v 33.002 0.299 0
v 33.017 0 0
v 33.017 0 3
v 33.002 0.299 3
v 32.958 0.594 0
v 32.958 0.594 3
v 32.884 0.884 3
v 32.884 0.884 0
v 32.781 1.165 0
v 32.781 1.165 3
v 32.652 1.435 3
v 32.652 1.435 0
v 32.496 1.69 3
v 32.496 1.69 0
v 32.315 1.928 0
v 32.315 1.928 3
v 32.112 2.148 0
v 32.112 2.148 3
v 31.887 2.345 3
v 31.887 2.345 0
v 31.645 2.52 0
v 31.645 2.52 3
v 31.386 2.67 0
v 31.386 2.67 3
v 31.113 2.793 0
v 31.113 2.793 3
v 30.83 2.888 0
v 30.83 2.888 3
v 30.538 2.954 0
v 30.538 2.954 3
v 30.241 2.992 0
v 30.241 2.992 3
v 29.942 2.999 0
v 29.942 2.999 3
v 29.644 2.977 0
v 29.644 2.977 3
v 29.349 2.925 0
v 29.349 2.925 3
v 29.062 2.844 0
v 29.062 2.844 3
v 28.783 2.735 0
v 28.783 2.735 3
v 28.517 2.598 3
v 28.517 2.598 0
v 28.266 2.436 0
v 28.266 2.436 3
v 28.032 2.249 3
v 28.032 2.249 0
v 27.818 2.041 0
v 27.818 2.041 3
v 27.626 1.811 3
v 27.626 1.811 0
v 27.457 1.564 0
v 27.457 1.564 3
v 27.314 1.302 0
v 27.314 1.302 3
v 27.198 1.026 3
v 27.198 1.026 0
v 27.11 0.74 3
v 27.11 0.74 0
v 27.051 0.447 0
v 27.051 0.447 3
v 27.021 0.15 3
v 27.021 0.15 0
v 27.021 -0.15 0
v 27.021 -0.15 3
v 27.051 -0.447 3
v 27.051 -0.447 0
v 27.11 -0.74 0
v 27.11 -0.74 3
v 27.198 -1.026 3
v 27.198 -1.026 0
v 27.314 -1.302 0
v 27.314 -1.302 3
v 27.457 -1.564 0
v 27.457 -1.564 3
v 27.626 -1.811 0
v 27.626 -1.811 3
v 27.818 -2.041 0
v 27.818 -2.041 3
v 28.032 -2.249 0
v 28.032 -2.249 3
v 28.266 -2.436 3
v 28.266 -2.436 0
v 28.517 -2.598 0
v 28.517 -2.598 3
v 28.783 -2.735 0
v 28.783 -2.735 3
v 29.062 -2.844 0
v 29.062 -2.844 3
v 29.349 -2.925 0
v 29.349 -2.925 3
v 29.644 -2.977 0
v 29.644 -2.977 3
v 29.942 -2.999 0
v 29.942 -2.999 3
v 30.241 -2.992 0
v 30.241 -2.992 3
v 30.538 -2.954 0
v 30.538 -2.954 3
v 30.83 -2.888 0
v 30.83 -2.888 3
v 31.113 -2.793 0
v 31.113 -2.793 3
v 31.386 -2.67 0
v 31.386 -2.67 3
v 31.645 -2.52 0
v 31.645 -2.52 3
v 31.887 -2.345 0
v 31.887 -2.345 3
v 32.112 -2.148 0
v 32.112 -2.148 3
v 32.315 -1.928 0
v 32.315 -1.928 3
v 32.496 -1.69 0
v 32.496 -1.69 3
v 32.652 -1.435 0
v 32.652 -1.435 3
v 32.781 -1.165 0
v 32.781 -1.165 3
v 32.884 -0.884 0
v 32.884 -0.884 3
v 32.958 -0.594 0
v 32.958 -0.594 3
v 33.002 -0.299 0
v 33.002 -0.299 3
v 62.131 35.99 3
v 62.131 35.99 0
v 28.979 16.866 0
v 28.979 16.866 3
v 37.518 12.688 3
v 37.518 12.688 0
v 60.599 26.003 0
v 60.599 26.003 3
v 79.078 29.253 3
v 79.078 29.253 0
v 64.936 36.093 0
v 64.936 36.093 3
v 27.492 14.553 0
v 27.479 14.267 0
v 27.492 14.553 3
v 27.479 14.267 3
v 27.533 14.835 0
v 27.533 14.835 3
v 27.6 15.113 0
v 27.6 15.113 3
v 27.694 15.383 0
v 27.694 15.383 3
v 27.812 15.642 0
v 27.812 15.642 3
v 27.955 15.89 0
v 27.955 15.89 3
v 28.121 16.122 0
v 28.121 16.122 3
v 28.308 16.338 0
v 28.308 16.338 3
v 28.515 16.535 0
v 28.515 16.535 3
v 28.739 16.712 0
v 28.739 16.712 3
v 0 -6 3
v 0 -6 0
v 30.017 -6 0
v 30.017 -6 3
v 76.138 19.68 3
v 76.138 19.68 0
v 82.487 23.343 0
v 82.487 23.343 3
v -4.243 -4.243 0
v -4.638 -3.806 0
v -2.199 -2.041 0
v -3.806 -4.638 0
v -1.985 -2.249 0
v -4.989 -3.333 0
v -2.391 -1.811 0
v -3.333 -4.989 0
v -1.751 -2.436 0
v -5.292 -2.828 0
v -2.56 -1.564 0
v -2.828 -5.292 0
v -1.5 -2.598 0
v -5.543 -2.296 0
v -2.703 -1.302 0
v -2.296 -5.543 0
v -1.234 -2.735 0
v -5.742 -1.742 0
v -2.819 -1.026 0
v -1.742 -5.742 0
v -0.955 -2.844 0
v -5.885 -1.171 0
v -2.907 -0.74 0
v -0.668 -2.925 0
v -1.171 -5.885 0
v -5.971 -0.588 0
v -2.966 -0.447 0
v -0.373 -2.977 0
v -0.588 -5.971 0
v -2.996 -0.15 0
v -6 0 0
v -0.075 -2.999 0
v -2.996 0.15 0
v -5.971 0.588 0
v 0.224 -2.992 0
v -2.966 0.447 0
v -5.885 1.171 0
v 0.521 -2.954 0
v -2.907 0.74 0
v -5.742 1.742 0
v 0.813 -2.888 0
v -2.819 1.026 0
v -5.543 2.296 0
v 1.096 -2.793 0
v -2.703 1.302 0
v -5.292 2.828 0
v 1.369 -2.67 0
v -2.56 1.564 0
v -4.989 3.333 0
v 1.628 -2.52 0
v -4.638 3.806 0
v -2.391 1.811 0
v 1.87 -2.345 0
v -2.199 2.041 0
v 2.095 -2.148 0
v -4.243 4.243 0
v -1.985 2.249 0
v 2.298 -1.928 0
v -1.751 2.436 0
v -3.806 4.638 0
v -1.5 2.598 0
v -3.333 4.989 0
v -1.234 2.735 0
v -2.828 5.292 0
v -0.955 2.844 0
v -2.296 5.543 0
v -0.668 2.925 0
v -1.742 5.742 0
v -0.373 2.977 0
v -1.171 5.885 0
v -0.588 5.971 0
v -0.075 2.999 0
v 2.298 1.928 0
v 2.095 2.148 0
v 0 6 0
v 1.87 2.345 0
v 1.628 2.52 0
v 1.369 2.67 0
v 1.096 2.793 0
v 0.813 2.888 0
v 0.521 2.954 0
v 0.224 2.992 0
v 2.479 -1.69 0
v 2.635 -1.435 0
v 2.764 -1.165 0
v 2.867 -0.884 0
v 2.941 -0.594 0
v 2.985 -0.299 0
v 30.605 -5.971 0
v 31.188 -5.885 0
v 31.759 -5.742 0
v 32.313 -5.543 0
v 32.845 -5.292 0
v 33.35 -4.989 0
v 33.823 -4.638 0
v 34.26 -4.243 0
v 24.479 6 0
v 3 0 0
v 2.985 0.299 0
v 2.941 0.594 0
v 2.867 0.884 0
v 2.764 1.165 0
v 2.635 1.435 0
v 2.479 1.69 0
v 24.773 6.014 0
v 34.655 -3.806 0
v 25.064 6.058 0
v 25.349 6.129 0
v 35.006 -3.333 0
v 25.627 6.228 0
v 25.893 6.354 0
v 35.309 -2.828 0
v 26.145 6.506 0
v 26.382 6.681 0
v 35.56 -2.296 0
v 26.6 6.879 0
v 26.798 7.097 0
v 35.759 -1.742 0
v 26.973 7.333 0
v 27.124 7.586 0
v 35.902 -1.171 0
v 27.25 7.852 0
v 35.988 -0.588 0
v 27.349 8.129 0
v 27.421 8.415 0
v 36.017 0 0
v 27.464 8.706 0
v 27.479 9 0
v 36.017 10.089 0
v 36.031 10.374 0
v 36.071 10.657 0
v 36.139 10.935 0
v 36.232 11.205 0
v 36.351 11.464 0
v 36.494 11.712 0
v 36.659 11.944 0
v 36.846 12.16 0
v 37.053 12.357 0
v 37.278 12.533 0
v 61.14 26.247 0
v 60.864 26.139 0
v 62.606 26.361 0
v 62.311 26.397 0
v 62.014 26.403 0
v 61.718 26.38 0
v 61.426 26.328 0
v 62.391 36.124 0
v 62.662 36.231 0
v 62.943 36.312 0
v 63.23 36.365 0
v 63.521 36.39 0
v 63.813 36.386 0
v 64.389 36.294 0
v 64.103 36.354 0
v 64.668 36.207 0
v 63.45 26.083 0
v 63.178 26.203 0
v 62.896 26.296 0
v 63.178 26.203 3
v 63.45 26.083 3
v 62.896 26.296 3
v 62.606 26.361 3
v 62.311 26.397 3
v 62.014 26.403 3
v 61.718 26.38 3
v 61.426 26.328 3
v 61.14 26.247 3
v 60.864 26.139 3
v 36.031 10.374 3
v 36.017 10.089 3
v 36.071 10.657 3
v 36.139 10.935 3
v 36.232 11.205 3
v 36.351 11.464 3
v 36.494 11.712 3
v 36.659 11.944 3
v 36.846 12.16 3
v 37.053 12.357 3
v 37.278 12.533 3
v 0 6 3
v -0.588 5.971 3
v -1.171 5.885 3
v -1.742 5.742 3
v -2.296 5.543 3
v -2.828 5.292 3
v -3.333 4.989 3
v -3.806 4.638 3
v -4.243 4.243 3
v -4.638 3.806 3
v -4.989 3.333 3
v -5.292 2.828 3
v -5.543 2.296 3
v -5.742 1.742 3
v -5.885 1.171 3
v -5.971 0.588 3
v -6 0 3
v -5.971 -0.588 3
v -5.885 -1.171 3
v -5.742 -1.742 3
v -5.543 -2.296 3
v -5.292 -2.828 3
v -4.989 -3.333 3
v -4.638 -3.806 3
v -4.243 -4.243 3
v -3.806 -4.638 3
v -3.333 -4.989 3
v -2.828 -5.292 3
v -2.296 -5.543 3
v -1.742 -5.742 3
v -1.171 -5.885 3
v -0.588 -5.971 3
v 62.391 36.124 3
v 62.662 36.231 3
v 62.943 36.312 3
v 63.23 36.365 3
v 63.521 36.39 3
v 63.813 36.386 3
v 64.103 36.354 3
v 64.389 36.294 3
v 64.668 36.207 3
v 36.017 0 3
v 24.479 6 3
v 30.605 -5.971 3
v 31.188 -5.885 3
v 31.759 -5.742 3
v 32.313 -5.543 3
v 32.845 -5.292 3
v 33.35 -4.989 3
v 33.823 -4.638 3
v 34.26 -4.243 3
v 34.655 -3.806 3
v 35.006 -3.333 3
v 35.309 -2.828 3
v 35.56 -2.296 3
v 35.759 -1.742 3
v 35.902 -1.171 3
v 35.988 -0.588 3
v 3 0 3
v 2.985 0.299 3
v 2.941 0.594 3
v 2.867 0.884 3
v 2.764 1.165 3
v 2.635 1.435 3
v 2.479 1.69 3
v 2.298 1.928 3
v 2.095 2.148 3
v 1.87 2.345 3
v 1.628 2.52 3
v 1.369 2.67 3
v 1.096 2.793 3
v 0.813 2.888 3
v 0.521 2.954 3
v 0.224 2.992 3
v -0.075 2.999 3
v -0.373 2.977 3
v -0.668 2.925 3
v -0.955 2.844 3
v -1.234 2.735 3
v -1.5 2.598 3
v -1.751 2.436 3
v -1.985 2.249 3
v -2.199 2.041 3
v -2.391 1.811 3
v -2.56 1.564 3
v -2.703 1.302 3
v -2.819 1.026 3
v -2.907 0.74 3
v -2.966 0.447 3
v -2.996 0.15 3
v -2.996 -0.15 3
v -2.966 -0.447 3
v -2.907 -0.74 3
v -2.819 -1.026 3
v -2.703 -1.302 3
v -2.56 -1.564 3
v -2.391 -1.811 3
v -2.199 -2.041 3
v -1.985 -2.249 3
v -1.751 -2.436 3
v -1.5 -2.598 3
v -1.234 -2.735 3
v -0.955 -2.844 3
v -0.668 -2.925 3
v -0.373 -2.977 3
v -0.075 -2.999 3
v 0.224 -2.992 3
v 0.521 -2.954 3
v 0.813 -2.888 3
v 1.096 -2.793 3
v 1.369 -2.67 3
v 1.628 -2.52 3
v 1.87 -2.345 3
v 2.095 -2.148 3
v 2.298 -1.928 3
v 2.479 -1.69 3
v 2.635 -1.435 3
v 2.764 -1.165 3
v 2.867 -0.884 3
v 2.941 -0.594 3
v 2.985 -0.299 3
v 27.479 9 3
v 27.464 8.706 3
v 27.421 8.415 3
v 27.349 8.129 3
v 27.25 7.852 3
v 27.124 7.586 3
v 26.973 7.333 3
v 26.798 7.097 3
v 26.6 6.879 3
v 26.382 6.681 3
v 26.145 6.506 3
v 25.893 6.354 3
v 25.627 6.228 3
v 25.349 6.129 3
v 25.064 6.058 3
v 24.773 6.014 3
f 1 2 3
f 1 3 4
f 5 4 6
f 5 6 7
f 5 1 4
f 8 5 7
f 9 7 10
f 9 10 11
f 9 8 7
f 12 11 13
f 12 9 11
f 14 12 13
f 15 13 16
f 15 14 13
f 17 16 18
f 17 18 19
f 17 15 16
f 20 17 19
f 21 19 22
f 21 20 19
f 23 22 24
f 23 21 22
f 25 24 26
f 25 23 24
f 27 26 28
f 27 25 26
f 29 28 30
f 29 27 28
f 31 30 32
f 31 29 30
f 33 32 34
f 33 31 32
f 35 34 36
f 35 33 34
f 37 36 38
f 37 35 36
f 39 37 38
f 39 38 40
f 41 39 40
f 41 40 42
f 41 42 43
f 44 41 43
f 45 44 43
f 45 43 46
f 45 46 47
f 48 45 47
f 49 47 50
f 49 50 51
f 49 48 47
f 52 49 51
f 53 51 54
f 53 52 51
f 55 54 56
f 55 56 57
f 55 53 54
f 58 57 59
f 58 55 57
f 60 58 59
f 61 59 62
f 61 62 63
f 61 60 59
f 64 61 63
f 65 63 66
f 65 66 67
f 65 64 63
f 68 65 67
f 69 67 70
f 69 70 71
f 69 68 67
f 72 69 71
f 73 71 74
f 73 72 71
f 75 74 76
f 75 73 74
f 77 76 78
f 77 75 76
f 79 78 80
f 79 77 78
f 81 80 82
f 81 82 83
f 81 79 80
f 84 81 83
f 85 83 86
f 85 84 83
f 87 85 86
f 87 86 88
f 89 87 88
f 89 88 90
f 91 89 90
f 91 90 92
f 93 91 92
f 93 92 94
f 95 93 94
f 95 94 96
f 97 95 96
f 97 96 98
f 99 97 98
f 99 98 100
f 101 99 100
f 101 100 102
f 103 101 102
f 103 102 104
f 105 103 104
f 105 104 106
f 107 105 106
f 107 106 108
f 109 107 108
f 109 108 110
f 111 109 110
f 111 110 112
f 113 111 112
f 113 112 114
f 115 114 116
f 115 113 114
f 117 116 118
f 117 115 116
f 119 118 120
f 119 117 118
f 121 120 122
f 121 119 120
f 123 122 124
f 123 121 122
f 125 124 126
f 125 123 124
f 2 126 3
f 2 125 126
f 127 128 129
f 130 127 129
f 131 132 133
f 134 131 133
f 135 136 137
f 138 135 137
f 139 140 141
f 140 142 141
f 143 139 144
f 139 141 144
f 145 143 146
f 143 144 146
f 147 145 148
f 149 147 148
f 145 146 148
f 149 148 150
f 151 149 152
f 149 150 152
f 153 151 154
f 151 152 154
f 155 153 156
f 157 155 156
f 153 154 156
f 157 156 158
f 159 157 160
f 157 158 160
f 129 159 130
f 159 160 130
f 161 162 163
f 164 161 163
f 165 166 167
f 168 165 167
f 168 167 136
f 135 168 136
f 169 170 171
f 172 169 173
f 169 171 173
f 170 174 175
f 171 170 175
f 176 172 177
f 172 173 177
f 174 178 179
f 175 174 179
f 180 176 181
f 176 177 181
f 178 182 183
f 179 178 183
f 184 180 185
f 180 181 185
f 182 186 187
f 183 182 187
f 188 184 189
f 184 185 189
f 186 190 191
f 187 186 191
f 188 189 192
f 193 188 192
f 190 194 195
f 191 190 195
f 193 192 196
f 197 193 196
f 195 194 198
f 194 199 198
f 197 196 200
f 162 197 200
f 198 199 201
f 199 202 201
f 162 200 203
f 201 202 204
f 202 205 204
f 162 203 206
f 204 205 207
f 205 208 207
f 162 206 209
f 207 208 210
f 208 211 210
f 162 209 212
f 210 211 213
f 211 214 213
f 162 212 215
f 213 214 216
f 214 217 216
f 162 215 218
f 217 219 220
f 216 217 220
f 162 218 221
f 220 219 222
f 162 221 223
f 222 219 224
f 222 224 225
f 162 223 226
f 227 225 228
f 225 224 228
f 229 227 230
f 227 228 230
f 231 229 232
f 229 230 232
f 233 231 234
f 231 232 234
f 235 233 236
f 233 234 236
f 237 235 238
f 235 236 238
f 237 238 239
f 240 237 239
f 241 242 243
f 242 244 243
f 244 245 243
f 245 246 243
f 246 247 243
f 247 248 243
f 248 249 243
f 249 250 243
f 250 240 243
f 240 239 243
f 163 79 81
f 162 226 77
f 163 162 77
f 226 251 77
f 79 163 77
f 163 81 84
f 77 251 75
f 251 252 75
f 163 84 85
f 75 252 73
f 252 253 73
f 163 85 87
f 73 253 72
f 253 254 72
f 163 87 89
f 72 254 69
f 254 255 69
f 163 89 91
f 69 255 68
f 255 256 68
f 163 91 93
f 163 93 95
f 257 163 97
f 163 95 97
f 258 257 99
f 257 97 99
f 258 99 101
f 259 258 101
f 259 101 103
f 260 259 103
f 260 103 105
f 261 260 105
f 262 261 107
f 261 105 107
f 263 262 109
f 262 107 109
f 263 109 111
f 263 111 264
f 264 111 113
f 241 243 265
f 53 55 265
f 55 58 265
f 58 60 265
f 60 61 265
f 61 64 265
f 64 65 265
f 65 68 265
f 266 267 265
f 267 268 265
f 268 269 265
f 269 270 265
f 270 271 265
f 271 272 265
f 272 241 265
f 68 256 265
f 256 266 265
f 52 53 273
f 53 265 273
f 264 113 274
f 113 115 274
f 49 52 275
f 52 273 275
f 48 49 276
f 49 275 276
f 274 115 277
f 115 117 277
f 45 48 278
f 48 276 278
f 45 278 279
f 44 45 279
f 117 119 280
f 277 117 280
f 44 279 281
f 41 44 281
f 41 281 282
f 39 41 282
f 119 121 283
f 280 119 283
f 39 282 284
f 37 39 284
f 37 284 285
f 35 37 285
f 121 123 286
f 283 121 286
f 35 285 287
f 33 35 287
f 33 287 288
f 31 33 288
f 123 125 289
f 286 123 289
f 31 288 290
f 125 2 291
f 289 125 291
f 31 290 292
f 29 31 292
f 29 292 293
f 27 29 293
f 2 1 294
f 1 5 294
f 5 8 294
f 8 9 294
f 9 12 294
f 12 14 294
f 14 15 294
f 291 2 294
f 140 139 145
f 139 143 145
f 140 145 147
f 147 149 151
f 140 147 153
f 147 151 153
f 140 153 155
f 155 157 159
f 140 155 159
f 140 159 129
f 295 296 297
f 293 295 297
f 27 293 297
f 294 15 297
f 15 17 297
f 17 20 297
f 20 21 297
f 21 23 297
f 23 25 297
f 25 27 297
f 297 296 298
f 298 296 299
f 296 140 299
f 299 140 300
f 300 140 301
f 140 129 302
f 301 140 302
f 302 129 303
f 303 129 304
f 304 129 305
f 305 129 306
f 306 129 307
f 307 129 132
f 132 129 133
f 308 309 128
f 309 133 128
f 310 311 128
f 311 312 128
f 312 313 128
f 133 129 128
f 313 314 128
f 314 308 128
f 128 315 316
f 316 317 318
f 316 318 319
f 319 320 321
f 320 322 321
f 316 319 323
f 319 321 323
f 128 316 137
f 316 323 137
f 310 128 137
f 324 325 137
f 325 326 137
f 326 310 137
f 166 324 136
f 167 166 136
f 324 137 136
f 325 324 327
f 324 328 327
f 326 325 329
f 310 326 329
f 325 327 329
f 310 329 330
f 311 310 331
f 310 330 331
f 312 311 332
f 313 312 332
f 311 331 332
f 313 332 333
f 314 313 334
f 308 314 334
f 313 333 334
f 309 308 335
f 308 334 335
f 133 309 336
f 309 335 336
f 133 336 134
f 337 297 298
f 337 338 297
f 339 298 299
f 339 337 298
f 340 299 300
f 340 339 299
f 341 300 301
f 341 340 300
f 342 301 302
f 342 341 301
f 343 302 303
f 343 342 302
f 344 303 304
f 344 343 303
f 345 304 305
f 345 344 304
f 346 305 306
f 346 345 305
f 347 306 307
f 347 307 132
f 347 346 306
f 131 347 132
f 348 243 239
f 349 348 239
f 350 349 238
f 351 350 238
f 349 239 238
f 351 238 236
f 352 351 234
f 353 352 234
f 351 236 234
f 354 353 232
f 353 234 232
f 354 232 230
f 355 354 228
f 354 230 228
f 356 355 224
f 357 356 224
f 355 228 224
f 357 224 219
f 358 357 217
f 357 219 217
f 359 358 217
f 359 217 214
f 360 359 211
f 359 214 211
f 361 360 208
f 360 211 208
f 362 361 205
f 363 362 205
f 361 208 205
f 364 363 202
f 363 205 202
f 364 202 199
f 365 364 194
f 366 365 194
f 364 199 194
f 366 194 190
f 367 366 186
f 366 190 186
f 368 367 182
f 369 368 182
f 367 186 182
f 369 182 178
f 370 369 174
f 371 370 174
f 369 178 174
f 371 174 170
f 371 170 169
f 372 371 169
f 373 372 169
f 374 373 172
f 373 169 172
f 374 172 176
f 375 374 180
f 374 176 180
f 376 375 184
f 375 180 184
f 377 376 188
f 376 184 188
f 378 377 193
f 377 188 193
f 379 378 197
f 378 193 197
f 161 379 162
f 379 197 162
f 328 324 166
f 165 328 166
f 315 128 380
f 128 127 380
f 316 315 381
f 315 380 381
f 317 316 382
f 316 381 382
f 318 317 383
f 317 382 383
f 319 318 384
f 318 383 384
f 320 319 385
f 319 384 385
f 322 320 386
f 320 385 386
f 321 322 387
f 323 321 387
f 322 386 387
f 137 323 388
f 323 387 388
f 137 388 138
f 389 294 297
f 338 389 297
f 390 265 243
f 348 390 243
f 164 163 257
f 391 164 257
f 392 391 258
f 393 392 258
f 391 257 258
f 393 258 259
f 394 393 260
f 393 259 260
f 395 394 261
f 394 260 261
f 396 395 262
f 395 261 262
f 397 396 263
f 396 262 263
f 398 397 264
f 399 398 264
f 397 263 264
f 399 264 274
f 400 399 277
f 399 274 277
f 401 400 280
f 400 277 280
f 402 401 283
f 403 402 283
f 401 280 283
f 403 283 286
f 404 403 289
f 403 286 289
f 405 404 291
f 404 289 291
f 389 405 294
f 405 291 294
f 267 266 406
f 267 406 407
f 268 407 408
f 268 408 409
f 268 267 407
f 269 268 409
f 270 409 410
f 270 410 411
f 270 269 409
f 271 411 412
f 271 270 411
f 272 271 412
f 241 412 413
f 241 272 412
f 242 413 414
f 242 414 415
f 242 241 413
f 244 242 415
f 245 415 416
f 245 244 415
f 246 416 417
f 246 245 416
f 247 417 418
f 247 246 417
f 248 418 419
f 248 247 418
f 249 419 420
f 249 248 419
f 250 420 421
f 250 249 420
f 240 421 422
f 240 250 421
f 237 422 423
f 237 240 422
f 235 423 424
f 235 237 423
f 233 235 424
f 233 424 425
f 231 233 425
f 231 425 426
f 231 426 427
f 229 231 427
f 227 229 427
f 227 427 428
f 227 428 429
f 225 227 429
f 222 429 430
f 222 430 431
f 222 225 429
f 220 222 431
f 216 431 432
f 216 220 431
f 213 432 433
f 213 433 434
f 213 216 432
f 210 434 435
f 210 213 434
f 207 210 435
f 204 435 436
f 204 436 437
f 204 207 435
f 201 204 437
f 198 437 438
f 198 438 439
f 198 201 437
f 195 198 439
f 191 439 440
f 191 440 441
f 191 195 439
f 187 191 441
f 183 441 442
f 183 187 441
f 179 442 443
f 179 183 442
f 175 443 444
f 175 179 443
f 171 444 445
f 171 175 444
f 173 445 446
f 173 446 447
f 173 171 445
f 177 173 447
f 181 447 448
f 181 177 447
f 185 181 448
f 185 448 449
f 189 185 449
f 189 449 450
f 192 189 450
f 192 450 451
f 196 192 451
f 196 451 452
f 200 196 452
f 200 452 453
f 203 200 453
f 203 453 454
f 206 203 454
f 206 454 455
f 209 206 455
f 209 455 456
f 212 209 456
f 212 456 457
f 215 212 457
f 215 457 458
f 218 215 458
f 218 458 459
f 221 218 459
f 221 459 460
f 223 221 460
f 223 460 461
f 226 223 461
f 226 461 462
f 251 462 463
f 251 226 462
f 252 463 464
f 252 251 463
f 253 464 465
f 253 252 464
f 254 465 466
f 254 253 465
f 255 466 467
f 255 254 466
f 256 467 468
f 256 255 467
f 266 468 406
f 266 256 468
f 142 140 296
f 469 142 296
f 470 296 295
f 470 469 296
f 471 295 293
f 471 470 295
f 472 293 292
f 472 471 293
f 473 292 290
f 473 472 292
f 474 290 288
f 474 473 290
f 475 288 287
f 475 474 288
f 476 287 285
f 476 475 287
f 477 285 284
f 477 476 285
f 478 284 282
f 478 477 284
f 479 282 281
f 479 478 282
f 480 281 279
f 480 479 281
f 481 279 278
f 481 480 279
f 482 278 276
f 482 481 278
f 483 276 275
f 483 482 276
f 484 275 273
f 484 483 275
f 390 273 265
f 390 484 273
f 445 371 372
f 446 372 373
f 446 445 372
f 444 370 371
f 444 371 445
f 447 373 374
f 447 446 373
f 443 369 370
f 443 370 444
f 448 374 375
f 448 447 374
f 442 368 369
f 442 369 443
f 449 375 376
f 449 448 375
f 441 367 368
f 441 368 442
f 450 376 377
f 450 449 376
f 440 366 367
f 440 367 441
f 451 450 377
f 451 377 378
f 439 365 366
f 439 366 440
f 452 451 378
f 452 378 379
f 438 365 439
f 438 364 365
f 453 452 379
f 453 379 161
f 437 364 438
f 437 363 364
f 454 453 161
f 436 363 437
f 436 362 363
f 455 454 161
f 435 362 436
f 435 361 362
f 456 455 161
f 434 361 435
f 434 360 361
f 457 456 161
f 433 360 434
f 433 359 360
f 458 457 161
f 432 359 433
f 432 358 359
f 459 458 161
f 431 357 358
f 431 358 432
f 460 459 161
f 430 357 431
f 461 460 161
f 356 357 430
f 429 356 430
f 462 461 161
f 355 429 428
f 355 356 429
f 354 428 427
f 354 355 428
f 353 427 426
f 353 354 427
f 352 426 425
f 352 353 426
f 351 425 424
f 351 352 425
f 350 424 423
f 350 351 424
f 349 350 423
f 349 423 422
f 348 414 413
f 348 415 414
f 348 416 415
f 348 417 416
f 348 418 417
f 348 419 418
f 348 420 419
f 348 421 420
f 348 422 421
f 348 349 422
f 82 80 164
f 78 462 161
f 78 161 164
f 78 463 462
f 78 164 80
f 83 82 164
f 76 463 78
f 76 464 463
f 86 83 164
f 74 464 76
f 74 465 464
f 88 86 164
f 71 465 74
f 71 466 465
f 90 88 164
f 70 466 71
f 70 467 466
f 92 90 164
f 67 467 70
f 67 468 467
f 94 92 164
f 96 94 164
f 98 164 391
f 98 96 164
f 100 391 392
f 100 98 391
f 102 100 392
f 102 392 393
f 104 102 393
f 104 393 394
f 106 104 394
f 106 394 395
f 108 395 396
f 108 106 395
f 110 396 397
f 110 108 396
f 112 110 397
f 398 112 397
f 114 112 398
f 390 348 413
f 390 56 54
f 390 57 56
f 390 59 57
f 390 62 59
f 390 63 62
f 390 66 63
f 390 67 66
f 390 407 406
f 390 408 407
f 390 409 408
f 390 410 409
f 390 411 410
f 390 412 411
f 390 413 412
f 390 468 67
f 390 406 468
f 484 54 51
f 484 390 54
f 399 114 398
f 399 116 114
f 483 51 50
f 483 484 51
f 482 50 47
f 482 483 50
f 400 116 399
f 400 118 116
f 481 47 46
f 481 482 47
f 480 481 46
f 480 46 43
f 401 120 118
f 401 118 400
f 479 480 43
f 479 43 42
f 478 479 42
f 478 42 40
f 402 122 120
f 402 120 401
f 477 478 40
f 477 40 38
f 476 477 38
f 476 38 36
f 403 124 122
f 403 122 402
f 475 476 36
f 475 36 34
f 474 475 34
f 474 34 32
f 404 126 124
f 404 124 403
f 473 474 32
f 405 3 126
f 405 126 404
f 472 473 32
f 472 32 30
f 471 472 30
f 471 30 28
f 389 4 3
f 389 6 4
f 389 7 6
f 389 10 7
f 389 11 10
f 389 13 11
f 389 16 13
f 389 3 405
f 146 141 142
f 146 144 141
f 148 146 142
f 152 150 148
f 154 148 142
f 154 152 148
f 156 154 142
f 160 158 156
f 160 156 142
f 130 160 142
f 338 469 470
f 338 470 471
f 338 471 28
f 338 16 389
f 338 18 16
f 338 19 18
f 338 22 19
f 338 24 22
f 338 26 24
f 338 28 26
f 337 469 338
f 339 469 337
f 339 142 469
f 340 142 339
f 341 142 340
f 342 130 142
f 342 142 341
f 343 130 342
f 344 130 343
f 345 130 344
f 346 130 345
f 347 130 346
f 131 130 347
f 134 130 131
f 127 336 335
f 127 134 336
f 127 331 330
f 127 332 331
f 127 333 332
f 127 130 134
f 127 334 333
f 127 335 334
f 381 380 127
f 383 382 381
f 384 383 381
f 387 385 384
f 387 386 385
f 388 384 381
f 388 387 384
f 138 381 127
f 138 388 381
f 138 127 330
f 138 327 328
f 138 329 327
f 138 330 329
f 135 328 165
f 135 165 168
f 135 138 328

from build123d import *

# Parameters (mm, degrees)
SKETCH1_R           = 3
BOSS_EXTRUDE1_DEPTH = 3
FILLET1_R           = 3
FILLET2_R           = 3
FILLET3_R           = 3


with BuildPart() as part:
    # Sketch1 → Boss-Extrude1 (new body)
    with BuildSketch(Plane.XY):
        with BuildLine():
            Line((27.478538516, 6), (0, 6))
            ThreePointArc((0, 6), (-6, 0), (0, -6))
            Line((0, -6), (30.017, -6))
            ThreePointArc((30.017, -6), (34.259640687, -4.242640687), (36.017, 0))
            Line((36.017, 0), (36.017, 11.821966509))
            Line((36.017, 11.821966509), (62.002996518, 26.812896598))
            Line((62.002996518, 26.812896598), (76.138457922, 19.6799669))
            Line((76.138457922, 19.6799669), (82.48746868, 23.342615602))
            Line((82.48746868, 23.342615602), (79.078019732, 29.252717774))
            Line((79.078019732, 29.252717774), (63.506652751, 36.784076585))
            Line((63.506652751, 36.784076585), (27.478538516, 16))
            Line((27.478538516, 16), (27.478538516, 6))
        make_face()
        Circle(SKETCH1_R, mode=Mode.SUBTRACT)
        with Locations((30.017, 0)):
            Circle(SKETCH1_R, mode=Mode.SUBTRACT)
    extrude(amount=BOSS_EXTRUDE1_DEPTH)

    # Fillet1
    fillet1_edges = [part.edges().sort_by_distance(p)[0] for p in [
        (27.478538516, 16, 1.5),
    ]]
    fillet(fillet1_edges, radius=FILLET1_R)

    # Fillet2
    fillet2_edges = [part.edges().sort_by_distance(p)[0] for p in [
        (27.478538516, 6, 1.5),
    ]]
    fillet(fillet2_edges, radius=FILLET2_R)

    # Fillet3
    fillet3_edges = [part.edges().sort_by_distance(p)[0] for p in [
        (63.506652751, 36.784076585, 1.5),
        (62.002996518, 26.812896598, 1.5),
        (36.017, 11.821966509, 1.5),
    ]]
    fillet(fillet3_edges, radius=FILLET3_R)


solid = part.part
